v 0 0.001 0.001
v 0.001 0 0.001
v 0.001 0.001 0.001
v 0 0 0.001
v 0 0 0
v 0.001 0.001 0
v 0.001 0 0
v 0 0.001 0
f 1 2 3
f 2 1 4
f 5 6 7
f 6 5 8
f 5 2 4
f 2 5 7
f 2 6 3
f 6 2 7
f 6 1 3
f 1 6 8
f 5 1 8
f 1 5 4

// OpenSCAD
// t_mesh — mesh properties WITHOUT rendering. This is the tier that catches the
// silent-material-loss class; CGAL's "Simple: yes" does not (docs/developer/verification.md).

// clang-format off
use <../src/uniTube.scad>;
// clang-format on

$fa = 6;
$fs = 0.5;

path = ut_polyline([ [ 0, 0, 0 ], [ 50, 0, 0 ], [ 50, 50, 0 ] ], r = 15);
prof = ut_round(od = 12, wall = 2);
N = len(ut_prof_outer(prof));

// Analytic expectation: the swept area is the annulus between two N-gons, and
// the developed length is exact. Faceting the arc makes the mesh slightly
// smaller than the ideal, hence the band rather than an equality.
poly_area = function(r)(N / 2) * r * r * sin(360 / N);
expected = (poly_area(6) - poly_area(4)) * ut_length(path);
vol = ut_run_volume(path, prof);
assert(abs(vol - expected) / expected < 0.005,
       str("mesh volume ", vol, " must be within 0.5% of the analytic ", expected));

// The bore is a POSITIVE solid built from the same spine, stations and frame.
// That is what makes the junction two-pass free (AGENTS.md rule 5).
bore = ut_run_volume(path, prof, "bore");
shell = ut_run_volume(path, prof, "shell");
assert(abs(shell - bore - vol) / vol < 1e-6, "shell - bore must equal the finished wall exactly");
assert(abs(bore - poly_area(4) * ut_length(path)) / bore < 0.005, "bore volume matches the analytic lumen");

// Face and vertex counts are structural, not approximate.
sts = ut_stations(path);
pts = ut_mesh_points(ut_solid_rgn(prof), sts);
fcs = ut_mesh_faces(ut_solid_rgn(prof), sts);
assert(len(pts) == len(sts) * 2 * N, "annular mesh has 2N vertices per station");
assert(len(fcs) == (len(sts) - 1) * 4 * N + 4 * N, "annular mesh face count: skins plus two ring caps");
assert(min([for (f = fcs) len(f)]) == 3 && max([for (f = fcs) len(f)]) == 3,
       "every face is a TRIANGLE -- swept quads are non-planar and OpenSCAD would guess");

// Every vertex index is in range: an out-of-range index is a silent bad mesh.
assert(max([for (f = fcs) max(f)]) == len(pts) - 1, "face indices reach exactly the last vertex");
assert(min([for (f = fcs) min(f)]) == 0, "face indices start at 0");

// WINDING. ut_mesh_faces() is counter-clockwise seen from outside, so ut_volume()
// is positive; polyhedron() wants clockwise, and ut_sweep() converts with
// _ut_cw() at the one place the mesh is emitted. Passing the faces through
// unconverted made every swept solid inside-out, which no gate on 2021.01 could
// see: CGAL repairs orientation in a boolean. `just check` measures the sign of
// the EXPORTED mesh, which is the half this file cannot.
assert(ut_volume(pts, fcs) > 0, "ut_mesh_faces winds counter-clockwise from outside: positive volume");
assert(abs(ut_volume(pts, _ut_cw(fcs)) + ut_volume(pts, fcs)) < 1e-9,
       "_ut_cw reverses every face, so the volume changes sign exactly");
assert(len(_ut_cw(fcs)) == len(fcs), "and it drops none");

cube(0.001); // sentinel
